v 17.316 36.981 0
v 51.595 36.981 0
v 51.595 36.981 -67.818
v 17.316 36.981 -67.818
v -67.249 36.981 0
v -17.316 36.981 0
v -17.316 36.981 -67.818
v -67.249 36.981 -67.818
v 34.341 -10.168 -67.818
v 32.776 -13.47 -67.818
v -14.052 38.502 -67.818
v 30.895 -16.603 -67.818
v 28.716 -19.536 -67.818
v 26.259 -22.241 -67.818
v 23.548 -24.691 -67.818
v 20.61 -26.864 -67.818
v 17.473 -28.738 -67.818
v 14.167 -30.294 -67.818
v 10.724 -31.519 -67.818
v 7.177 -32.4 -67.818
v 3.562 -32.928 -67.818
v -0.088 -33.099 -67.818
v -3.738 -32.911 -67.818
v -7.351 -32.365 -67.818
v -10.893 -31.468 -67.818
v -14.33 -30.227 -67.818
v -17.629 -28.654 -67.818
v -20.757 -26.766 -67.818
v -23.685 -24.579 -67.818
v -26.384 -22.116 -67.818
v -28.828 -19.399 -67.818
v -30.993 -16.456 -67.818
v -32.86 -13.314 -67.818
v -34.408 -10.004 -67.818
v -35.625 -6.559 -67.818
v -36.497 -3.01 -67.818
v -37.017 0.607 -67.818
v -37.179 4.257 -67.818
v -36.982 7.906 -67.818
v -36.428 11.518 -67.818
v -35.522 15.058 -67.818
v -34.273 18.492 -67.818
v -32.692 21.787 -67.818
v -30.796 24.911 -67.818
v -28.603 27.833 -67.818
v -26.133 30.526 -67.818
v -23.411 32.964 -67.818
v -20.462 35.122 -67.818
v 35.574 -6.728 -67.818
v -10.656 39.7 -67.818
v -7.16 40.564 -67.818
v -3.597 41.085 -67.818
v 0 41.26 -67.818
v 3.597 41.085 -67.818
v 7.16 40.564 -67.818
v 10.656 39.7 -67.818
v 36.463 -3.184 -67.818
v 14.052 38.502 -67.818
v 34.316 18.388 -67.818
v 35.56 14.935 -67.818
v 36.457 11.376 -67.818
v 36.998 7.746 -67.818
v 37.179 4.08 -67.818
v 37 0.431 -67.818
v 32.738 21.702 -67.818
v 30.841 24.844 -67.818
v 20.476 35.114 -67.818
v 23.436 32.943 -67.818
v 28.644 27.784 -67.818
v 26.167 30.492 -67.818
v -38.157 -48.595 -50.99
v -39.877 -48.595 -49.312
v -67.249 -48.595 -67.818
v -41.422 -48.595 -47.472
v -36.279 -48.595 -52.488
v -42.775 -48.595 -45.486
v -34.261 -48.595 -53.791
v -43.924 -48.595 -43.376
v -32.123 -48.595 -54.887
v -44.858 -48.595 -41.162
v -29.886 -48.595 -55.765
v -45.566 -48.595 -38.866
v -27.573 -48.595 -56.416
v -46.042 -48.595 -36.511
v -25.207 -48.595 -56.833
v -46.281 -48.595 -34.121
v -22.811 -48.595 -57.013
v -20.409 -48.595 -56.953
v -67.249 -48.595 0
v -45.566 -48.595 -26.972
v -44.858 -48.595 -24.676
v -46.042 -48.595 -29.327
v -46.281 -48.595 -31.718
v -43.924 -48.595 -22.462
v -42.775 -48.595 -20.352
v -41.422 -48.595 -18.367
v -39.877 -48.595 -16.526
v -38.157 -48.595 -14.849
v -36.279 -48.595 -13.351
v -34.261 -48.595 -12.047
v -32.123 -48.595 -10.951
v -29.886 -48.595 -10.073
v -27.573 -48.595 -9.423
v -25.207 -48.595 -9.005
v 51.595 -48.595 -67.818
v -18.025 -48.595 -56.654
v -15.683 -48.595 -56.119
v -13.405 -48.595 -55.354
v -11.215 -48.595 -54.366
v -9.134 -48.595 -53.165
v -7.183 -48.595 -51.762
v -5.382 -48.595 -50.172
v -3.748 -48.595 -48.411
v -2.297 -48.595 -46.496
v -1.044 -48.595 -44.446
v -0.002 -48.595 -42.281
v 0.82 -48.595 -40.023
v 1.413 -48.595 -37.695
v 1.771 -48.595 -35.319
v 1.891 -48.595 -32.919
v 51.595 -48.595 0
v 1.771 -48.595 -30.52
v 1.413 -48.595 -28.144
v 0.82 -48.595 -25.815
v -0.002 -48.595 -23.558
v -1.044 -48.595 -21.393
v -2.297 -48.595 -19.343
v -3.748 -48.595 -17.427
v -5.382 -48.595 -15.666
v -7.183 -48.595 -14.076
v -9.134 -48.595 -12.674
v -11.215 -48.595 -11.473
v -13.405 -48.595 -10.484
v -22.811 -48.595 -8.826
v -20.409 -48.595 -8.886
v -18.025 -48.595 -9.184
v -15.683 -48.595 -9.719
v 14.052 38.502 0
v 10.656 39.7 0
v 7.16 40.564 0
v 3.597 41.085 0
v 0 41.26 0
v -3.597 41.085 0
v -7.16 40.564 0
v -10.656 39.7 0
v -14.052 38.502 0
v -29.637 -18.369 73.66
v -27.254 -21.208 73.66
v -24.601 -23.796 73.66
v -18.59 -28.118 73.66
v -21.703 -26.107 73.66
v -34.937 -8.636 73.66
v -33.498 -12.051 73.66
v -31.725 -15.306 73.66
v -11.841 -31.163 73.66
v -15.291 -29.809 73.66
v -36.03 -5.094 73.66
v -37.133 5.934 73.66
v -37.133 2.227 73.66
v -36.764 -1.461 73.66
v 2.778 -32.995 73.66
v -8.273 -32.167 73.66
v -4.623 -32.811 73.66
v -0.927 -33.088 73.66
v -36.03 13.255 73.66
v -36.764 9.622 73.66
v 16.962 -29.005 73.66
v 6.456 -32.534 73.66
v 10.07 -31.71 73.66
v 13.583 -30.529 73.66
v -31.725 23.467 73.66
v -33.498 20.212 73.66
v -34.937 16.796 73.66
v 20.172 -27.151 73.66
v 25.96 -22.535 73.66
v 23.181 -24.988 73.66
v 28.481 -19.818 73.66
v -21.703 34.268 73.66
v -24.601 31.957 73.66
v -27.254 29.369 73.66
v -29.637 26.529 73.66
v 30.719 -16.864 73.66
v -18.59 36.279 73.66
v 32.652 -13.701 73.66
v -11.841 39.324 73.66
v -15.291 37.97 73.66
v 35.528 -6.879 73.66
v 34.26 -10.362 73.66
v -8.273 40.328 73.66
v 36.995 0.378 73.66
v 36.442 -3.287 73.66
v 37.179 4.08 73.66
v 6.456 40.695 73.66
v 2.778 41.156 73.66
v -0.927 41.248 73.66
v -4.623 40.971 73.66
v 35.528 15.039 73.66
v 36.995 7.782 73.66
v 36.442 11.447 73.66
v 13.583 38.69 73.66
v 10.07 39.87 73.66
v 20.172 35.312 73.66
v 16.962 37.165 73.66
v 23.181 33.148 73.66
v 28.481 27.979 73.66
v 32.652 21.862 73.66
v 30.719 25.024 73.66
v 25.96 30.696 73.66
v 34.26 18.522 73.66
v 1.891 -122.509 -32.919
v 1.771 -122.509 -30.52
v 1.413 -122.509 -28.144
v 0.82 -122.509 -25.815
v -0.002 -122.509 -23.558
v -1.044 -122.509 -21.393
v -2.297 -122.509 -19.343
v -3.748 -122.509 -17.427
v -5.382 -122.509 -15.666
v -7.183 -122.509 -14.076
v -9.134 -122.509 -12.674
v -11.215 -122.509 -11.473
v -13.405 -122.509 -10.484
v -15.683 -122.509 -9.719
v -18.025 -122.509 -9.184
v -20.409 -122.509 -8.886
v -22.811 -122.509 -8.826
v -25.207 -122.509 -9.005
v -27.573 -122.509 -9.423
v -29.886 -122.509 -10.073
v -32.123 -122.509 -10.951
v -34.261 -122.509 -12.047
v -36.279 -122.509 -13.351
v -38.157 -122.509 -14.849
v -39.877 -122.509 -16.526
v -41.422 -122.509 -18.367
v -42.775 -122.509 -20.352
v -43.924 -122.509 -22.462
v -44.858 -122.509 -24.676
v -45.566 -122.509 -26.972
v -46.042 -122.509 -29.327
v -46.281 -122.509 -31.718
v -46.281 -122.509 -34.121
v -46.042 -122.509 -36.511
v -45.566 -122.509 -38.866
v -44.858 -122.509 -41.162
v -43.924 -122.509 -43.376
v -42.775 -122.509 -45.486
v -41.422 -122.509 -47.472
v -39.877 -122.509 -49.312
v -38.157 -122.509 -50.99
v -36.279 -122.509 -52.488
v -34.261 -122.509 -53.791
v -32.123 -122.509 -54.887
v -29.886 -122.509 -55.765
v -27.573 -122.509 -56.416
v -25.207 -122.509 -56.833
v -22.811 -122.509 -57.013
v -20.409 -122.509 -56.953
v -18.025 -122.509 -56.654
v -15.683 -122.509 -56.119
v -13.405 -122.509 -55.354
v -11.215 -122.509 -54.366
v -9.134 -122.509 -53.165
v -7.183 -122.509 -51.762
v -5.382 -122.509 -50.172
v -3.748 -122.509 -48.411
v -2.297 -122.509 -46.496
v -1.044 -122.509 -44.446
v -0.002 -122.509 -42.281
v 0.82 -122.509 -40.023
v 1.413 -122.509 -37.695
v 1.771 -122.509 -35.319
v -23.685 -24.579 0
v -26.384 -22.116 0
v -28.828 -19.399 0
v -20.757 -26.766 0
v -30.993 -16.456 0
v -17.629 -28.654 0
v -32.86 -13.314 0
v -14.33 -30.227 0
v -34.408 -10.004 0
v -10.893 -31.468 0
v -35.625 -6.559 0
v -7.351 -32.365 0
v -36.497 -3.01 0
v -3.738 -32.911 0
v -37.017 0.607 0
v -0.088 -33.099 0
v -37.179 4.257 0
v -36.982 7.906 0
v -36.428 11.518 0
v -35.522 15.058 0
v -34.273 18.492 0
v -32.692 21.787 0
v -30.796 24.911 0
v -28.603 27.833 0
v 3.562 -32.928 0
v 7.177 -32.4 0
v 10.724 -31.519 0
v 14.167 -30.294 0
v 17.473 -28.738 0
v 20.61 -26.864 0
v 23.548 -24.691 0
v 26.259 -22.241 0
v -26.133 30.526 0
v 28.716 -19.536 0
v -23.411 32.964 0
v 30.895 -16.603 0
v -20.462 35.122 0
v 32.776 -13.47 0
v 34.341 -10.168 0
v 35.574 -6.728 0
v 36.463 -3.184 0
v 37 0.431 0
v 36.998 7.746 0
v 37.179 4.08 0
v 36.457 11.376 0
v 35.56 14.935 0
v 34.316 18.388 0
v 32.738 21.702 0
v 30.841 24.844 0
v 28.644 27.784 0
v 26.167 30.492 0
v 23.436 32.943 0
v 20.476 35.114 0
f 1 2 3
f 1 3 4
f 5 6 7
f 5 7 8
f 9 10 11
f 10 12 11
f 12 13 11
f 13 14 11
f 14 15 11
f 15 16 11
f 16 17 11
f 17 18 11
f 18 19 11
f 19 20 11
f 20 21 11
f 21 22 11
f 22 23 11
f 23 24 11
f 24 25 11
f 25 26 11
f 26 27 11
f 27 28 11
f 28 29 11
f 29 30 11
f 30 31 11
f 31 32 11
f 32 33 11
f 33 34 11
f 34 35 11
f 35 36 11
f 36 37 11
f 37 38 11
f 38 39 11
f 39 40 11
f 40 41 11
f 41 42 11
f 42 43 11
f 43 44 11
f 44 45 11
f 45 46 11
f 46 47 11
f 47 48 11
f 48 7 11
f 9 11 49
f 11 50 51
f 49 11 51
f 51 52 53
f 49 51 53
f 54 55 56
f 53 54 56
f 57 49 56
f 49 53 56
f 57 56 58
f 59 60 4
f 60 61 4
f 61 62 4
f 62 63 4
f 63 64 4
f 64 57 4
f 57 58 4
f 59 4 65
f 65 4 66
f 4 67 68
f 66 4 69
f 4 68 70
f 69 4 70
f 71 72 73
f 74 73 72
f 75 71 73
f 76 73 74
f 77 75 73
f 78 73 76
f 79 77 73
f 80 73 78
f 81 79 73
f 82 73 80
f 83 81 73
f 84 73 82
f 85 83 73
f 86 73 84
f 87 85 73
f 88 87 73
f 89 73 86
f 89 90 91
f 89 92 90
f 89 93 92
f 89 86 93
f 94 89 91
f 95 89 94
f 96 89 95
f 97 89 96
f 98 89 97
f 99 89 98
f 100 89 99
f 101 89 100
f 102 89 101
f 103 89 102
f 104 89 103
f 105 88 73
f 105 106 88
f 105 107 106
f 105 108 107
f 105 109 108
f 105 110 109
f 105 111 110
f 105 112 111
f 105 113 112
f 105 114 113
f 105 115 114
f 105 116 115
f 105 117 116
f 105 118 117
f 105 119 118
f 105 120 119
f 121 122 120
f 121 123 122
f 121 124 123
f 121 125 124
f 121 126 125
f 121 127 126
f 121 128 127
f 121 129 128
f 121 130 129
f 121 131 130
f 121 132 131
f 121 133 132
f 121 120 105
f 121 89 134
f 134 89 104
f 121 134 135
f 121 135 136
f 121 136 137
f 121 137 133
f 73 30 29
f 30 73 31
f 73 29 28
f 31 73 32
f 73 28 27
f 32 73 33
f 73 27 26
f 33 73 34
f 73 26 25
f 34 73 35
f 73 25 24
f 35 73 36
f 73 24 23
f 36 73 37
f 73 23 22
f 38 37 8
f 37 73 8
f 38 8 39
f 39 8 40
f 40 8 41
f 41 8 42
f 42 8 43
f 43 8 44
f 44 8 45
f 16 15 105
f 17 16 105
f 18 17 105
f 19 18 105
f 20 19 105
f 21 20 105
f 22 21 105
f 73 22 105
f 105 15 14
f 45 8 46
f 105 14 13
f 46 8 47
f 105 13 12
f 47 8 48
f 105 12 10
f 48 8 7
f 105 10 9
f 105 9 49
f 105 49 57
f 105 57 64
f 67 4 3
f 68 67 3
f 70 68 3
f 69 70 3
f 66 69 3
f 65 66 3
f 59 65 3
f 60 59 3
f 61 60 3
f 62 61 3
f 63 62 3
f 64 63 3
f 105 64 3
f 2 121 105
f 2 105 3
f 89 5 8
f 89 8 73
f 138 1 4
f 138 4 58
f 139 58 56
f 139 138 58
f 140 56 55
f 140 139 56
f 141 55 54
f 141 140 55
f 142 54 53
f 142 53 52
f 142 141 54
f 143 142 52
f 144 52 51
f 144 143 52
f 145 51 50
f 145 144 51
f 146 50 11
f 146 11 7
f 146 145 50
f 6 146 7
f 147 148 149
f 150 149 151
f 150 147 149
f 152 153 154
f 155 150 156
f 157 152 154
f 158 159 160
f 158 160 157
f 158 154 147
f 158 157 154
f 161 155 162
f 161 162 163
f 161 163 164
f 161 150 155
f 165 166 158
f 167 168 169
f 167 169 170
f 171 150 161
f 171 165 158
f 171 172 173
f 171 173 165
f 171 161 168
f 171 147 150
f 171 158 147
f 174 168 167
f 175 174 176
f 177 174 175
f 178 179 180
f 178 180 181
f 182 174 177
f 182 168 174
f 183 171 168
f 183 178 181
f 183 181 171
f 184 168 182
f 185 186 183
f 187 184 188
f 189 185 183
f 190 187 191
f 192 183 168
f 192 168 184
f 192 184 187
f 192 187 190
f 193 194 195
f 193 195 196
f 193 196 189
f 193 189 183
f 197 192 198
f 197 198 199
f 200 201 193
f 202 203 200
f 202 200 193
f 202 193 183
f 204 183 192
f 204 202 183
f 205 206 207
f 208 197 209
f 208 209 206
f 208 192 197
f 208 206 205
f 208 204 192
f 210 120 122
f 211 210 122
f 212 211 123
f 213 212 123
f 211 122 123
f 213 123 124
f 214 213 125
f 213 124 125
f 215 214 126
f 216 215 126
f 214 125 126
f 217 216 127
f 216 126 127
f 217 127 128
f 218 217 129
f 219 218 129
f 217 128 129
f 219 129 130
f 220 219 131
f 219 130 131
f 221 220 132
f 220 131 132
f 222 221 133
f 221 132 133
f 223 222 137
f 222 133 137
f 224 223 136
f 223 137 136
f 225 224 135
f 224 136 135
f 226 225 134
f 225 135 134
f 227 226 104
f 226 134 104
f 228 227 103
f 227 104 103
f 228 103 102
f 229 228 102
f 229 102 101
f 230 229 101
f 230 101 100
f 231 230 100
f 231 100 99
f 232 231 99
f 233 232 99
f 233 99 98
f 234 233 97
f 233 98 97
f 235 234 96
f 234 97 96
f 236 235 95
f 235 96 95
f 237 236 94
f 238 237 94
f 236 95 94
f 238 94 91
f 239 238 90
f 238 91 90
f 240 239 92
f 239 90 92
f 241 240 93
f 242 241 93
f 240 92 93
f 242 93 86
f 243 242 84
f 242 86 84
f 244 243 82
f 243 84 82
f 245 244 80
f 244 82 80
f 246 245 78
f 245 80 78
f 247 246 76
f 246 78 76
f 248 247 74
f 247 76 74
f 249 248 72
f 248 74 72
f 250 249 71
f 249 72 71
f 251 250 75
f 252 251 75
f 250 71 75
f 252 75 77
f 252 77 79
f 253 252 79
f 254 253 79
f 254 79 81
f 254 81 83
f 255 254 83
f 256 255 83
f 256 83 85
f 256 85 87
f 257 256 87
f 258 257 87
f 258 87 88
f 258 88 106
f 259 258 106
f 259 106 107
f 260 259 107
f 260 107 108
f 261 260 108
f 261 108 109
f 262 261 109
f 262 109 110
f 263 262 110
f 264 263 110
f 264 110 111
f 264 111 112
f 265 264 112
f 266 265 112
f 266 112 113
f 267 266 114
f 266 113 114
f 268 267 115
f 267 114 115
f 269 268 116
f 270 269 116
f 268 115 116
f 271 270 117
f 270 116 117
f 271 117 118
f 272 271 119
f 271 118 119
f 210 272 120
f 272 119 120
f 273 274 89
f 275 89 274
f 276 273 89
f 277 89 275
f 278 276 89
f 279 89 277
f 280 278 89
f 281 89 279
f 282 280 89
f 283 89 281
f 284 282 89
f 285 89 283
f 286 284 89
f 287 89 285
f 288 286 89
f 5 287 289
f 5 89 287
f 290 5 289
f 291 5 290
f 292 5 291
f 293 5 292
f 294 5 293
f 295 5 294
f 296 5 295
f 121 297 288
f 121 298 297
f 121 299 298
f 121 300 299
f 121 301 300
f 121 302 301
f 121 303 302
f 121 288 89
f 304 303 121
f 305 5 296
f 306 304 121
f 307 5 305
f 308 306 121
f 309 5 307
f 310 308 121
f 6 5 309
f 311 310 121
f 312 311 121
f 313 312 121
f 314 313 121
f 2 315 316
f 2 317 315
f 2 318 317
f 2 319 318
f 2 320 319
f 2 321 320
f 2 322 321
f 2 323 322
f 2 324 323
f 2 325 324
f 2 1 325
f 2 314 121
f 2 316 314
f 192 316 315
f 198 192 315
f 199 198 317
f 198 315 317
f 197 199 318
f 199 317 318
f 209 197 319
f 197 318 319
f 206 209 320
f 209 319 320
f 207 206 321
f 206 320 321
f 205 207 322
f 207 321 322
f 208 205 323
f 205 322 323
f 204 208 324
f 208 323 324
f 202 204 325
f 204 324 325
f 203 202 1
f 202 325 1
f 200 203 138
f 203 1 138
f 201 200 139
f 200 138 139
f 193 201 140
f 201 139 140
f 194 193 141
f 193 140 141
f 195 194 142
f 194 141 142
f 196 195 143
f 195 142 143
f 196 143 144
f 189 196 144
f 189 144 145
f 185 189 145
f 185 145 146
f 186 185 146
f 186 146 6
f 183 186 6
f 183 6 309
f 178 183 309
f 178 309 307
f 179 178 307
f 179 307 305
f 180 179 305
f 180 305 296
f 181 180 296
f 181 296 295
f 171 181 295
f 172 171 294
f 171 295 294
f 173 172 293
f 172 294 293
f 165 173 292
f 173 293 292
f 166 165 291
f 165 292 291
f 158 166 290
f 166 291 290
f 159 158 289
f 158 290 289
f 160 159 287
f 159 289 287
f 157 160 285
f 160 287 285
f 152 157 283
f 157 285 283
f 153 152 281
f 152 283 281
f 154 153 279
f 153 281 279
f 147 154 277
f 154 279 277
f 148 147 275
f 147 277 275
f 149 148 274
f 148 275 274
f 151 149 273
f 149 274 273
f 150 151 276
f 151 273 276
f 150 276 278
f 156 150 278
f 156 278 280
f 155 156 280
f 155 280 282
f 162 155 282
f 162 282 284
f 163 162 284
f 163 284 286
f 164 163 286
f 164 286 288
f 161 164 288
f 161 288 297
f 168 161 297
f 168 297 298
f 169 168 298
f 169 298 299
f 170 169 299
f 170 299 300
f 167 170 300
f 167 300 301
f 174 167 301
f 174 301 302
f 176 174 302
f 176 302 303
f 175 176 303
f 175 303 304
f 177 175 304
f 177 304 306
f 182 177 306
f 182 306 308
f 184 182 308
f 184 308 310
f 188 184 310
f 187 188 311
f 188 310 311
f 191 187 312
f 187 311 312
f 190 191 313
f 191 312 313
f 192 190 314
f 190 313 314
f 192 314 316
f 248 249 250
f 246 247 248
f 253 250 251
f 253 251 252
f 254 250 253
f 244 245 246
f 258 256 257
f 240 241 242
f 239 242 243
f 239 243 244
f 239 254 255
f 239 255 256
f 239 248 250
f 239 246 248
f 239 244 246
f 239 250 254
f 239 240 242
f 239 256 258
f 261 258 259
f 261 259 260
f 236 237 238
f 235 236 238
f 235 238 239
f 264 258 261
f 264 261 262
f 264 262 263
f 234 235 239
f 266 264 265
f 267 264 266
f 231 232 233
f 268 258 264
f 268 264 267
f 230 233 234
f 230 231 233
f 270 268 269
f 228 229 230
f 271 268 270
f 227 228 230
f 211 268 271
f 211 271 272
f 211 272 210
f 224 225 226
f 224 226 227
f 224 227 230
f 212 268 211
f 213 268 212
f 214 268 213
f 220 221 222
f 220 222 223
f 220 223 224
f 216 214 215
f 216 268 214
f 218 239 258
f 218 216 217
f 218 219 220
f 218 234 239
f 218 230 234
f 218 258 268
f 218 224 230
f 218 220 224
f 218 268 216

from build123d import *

# Parameters (mm, degrees)
F0_R     = 37.1794953158
F1_DEPTH = 73.66
F3_DEPTH = 67.818
F4_R     = 24.1009432371
F5_DEPTH = 73.914


with BuildPart() as f1:
    # F0 (on Top) → F1 (new body)
    with BuildSketch(Plane.XY):
        with Locations((0, 4.0802885778)):
            Circle(F0_R)
    extrude(amount=F1_DEPTH)

    # F2 (on face) + F0 (on Top) → F3 (join)
    with BuildSketch(Plane.XY):
        with BuildLine():
            Line((-17.3161878706, 36.9811169803), (-67.2493875027, 36.9811169803))
            Line((-67.2493875027, 36.9811169803), (-67.2493875027, -48.5952086747))
            Line((-67.2493875027, -48.5952086747), (51.5947751701, -48.5952086747))
            Line((51.5947751701, -48.5952086747), (51.5947751701, 36.9811169803))
            Line((51.5947751701, 36.9811169803), (17.3161878706, 36.9811169803))
            ThreePointArc((17.3161878706, 36.9811169803), (31.8286191796, 23.2962682057), (37.1794953158, 4.0802885778))
            ThreePointArc((37.1794953158, 4.0802885778), (-19.2159796279, -27.7483306018), (-17.3161878706, 36.9811169803))
        make_face()
    with BuildSketch(Plane.XY):
        with Locations((0, 4.0802885778)):
            Circle(F0_R)
    extrude(amount=-F3_DEPTH)

    # F4 (on face) → F5 (join)
    with BuildSketch(Plane.XZ.offset(48.5952086747)):
        with Locations((-22.2101341933, -32.9192616045)):
            Circle(F4_R)
    extrude(amount=F5_DEPTH)


solid = f1.part
